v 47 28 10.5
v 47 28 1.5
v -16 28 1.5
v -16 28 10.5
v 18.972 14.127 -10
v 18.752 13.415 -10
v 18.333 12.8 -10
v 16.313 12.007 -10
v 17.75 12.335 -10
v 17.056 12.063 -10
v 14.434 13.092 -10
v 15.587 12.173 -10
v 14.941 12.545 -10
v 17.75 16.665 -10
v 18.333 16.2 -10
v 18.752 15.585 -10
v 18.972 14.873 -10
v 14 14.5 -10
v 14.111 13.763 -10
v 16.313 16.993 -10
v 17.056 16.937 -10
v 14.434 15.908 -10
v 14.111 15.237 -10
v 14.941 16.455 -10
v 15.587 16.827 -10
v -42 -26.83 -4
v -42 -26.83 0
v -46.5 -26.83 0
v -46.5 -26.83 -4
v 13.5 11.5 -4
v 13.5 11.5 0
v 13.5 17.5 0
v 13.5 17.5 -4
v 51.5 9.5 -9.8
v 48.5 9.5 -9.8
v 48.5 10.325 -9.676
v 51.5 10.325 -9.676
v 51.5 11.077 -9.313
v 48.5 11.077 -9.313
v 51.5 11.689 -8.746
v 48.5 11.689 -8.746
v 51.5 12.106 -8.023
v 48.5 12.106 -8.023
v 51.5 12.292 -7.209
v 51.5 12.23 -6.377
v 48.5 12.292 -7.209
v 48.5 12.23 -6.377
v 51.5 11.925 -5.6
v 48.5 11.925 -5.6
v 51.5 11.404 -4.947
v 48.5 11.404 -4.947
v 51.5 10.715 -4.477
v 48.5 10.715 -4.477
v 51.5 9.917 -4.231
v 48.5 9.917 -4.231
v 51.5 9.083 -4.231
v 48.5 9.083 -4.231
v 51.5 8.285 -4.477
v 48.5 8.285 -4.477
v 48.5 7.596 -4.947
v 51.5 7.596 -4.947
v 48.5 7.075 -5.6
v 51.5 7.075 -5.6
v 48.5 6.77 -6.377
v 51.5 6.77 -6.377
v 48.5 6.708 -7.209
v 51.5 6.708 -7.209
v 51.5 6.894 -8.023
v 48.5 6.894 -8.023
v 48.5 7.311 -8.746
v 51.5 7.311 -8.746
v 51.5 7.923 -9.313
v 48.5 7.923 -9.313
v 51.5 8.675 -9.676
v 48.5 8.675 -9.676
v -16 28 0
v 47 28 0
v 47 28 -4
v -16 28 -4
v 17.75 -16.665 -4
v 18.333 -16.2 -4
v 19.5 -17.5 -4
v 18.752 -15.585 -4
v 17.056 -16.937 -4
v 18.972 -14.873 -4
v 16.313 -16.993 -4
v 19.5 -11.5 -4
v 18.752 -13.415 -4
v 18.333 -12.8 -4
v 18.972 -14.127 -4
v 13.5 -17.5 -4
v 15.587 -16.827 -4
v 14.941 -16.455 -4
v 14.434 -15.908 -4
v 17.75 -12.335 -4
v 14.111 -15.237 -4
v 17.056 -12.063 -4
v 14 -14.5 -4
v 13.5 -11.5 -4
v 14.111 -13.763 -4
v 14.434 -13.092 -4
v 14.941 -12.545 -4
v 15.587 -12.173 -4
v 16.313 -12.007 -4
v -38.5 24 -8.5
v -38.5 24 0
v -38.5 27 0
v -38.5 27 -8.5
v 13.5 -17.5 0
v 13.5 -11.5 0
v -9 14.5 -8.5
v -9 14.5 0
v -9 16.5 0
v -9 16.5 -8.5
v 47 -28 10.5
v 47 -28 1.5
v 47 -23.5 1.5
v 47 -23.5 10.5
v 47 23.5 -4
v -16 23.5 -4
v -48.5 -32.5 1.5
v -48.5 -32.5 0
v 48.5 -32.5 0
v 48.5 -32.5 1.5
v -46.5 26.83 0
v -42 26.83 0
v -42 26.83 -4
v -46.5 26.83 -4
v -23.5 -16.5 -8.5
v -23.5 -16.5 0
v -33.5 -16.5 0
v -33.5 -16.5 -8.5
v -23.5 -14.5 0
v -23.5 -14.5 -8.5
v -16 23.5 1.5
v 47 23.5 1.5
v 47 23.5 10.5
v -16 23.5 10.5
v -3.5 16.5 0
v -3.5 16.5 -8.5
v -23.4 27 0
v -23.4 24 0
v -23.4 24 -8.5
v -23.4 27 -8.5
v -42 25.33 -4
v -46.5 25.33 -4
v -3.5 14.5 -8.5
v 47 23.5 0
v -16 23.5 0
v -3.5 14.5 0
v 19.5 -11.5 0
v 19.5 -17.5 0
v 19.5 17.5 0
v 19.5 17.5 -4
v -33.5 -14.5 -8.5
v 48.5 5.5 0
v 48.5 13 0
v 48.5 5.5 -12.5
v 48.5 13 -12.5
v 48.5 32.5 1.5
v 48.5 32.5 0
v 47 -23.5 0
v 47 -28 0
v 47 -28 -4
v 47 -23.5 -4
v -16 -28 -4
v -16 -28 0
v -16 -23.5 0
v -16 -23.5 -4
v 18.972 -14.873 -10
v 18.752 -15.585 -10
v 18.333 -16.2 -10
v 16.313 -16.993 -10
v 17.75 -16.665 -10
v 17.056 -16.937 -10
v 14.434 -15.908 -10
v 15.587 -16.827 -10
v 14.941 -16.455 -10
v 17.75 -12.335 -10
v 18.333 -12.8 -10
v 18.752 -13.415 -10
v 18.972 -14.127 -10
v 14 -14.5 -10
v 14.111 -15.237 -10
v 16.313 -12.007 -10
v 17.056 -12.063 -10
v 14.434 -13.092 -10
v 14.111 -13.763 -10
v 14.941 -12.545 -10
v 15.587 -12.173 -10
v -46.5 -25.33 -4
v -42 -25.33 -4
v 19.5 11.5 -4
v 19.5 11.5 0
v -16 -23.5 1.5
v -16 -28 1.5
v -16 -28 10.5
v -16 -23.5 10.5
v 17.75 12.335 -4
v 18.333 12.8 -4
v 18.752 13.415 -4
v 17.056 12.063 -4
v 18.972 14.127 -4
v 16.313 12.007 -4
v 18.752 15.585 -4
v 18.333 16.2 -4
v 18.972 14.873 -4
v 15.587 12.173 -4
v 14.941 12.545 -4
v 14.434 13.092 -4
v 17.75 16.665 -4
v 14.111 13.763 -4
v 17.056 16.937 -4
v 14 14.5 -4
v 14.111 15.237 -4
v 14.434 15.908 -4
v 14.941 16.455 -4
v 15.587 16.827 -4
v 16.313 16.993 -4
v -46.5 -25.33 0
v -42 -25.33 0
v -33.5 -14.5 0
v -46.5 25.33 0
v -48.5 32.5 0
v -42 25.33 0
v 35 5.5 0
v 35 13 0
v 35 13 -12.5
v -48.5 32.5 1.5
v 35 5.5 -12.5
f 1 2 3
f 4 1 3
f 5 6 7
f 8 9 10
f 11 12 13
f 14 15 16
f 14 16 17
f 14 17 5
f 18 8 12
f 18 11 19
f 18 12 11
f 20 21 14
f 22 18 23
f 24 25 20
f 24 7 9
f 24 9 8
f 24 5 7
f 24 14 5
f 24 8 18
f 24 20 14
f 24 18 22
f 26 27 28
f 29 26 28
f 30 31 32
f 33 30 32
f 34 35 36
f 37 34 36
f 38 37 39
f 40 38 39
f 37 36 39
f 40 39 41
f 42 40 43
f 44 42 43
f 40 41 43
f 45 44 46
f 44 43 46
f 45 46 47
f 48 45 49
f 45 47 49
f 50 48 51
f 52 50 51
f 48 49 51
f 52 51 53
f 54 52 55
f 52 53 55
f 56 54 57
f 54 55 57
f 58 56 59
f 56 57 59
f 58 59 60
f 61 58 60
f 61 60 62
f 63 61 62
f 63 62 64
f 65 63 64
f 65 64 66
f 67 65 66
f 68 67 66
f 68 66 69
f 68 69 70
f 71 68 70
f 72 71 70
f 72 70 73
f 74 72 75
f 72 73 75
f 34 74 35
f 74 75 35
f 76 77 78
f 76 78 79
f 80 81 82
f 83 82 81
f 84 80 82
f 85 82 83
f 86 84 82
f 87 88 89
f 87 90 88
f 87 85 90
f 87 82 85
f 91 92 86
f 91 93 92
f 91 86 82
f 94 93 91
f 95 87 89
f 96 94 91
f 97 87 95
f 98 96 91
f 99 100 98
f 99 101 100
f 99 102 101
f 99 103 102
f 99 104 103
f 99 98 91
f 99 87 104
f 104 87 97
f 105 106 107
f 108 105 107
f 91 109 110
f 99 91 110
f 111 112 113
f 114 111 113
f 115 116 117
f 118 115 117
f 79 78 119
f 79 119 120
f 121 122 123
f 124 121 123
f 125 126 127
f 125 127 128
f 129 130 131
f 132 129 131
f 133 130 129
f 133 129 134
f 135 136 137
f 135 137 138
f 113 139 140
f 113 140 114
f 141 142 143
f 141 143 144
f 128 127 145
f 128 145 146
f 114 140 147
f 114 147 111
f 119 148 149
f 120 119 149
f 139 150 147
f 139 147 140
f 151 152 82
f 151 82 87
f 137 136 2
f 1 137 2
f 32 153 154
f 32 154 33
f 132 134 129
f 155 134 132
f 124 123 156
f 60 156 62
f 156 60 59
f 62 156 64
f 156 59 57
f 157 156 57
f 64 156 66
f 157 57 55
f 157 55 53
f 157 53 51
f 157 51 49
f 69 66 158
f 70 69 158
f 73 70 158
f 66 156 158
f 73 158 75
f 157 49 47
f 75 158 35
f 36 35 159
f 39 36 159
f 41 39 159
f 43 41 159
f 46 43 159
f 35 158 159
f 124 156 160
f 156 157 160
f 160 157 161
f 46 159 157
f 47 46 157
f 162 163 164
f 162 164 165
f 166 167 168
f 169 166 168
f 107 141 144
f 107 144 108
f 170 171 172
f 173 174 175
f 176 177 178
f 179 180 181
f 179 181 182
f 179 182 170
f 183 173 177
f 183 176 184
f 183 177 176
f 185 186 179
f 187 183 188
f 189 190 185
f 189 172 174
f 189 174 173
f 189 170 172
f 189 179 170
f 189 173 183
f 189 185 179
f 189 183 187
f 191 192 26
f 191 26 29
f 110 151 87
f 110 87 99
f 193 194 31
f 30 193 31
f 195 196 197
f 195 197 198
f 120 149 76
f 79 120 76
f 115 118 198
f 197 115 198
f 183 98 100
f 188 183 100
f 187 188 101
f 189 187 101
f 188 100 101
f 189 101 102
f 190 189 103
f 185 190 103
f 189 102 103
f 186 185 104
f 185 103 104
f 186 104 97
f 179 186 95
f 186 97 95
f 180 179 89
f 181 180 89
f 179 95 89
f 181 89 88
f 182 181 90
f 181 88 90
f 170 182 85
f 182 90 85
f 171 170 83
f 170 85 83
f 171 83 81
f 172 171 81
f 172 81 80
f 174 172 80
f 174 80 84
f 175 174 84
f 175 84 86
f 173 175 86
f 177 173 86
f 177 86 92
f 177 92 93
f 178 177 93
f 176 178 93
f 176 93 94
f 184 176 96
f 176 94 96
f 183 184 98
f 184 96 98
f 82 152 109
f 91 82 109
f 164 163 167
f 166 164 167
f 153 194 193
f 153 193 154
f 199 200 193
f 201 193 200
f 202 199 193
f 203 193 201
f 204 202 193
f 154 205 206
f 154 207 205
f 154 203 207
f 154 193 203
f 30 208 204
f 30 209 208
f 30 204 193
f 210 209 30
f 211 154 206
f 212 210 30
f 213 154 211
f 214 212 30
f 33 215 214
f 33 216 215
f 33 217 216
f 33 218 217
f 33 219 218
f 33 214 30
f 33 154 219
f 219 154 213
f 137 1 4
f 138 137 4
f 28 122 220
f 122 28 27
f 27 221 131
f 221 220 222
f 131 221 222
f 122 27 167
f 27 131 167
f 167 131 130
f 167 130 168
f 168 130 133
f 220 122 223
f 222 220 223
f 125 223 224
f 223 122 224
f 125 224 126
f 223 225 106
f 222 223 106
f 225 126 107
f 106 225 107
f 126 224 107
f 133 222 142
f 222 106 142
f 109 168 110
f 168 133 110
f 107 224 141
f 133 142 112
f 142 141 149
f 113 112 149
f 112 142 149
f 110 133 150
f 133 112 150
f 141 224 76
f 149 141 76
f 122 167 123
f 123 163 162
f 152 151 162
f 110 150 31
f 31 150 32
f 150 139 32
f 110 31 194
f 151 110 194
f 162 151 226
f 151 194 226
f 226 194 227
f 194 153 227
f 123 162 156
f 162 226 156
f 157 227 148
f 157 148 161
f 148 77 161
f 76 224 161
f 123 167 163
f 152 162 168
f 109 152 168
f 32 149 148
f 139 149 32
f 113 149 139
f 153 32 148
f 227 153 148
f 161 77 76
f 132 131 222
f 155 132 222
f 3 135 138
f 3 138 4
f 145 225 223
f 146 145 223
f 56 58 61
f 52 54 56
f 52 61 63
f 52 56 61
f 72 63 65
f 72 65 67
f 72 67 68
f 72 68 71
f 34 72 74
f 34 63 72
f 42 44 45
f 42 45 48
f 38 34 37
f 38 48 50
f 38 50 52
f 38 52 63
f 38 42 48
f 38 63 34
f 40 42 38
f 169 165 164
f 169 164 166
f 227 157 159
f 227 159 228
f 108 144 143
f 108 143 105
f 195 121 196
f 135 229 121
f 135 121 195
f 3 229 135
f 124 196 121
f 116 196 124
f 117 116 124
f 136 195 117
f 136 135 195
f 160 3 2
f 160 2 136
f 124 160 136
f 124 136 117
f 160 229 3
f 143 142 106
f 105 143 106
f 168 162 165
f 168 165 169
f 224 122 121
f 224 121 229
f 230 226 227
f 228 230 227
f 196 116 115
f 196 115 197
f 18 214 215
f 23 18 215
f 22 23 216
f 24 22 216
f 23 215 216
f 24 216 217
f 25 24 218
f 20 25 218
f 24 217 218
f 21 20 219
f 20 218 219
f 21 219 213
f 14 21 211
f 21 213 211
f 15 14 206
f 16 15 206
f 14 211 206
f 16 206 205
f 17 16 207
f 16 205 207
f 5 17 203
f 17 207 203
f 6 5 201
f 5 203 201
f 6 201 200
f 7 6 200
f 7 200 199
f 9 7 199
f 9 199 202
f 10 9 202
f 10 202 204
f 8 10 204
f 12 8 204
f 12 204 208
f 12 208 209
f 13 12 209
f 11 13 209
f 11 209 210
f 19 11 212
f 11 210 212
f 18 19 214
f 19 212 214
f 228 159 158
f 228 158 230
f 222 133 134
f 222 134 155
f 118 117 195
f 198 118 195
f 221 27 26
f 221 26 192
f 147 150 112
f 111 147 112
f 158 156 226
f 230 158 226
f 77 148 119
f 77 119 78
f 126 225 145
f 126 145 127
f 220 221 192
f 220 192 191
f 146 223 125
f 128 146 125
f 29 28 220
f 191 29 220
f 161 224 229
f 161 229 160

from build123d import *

# Parameters (mm, degrees)
SKETCH1_W                = 97
SKETCH1_H                = 65
BOSS_EXTRUDE1_DEPTH      = 1.5
SKETCH2_W                = 63
SKETCH2_H                = 4.5
BOSS_EXTRUDE2_DEPTH      = 4
BOSS_EXTRUDE2_DEPTH_BACK = 10.5
SKETCH3_W                = 13.5
SKETCH3_H                = 7.5
BOSS_EXTRUDE3_DEPTH      = 12.5
SKETCH4_R                = 2.8
BOSS_EXTRUDE4_DEPTH      = 3
SKETCH5_W                = 4.5
SKETCH5_H                = 1.5
BOSS_EXTRUDE5_DEPTH      = 4
SKETCH6_W                = 15.1
SKETCH6_H                = 3
BOSS_EXTRUDE6_DEPTH      = 8.5
SKETCH7_W                = 10
SKETCH7_H                = 2
BOSS_EXTRUDE7_DEPTH      = 8.5
SKETCH8_W                = 5.5
SKETCH8_H                = 2
BOSS_EXTRUDE8_DEPTH      = 8.5
SKETCH9_W                = 6
SKETCH9_H                = 6
BOSS_EXTRUDE9_DEPTH      = 4
SKETCH10_R               = 2.5
BOSS_EXTRUDE10_DEPTH     = 6
SKETCH13_R               = 2.5
BOSS_EXTRUDE11_DEPTH     = 6


with BuildPart() as part:
    # Sketch1 → Boss-Extrude1 (new body)
    with BuildSketch(Plane.XY):
        Rectangle(SKETCH1_W, SKETCH1_H)
    extrude(amount=BOSS_EXTRUDE1_DEPTH)

    # Sketch2 → Boss-Extrude2 (add, two sides)
    with BuildSketch(Plane(origin=(0, 0, 0), x_dir=(-1, 0, 0), z_dir=(0, 0, -1))) as boss_extrude2_sk:
        with Locations((-15.5, 25.75)):
            Rectangle(SKETCH2_W, SKETCH2_H)
        with Locations((-15.5, -25.75)):
            Rectangle(SKETCH2_W, SKETCH2_H)
    extrude(amount=BOSS_EXTRUDE2_DEPTH)
    extrude(boss_extrude2_sk.sketch, amount=-BOSS_EXTRUDE2_DEPTH_BACK)

    # Sketch3 → Boss-Extrude3 (add)
    with BuildSketch(Plane(origin=(0, 0, 0), x_dir=(-1, 0, 0), z_dir=(0, 0, -1))):
        with Locations((-41.75, 9.25)):
            Rectangle(SKETCH3_W, SKETCH3_H)
    extrude(amount=BOSS_EXTRUDE3_DEPTH)

    # Sketch4 → Boss-Extrude4 (add)
    with BuildSketch(Plane(origin=(48.5, 0, 0), x_dir=(0, 0, -1), z_dir=(1, 0, 0))):
        with Locations((7, 9.5)):
            Circle(SKETCH4_R)
    extrude(amount=BOSS_EXTRUDE4_DEPTH)

    # Sketch5 → Boss-Extrude5 (add)
    with BuildSketch(Plane(origin=(0, 0, 0), x_dir=(-1, 0, 0), z_dir=(0, 0, -1))):
        with Locations((44.25, -26.080181332)):
            Rectangle(SKETCH5_W, SKETCH5_H)
        with Locations((44.25, 26.080181332)):
            Rectangle(SKETCH5_W, SKETCH5_H)
    extrude(amount=BOSS_EXTRUDE5_DEPTH)

    # Sketch6 → Boss-Extrude6 (add)
    with BuildSketch(Plane(origin=(0, 0, 0), x_dir=(-1, 0, 0), z_dir=(0, 0, -1))):
        with Locations((30.95, 25.5)):
            Rectangle(SKETCH6_W, SKETCH6_H)
    extrude(amount=BOSS_EXTRUDE6_DEPTH)

    # Sketch7 → Boss-Extrude7 (add)
    with BuildSketch(Plane(origin=(0, 0, 0), x_dir=(-1, 0, 0), z_dir=(0, 0, -1))):
        with Locations((28.5, -15.5)):
            Rectangle(SKETCH7_W, SKETCH7_H)
    extrude(amount=BOSS_EXTRUDE7_DEPTH)

    # Sketch8 → Boss-Extrude8 (add)
    with BuildSketch(Plane(origin=(0, 0, 0), x_dir=(-1, 0, 0), z_dir=(0, 0, -1))):
        with Locations((6.25, 15.5)):
            Rectangle(SKETCH8_W, SKETCH8_H)
    extrude(amount=BOSS_EXTRUDE8_DEPTH)

    # Sketch9 → Boss-Extrude9 (add)
    with BuildSketch(Plane(origin=(0, 0, 0), x_dir=(-1, 0, 0), z_dir=(0, 0, -1))):
        with Locations((-16.5, -14.5)):
            Rectangle(SKETCH9_W, SKETCH9_H)
        with Locations((-16.5, 14.5)):
            Rectangle(SKETCH9_W, SKETCH9_H)
    extrude(amount=BOSS_EXTRUDE9_DEPTH)

    # Sketch10 → Boss-Extrude10 (add)
    with BuildSketch(Plane(origin=(0, 0, -4), x_dir=(-1, 0, 0), z_dir=(0, 0, -1))):
        with Locations((-16.5, 14.5)):
            Circle(SKETCH10_R)
    extrude(amount=BOSS_EXTRUDE10_DEPTH)

    # Sketch13 → Boss-Extrude11 (add)
    with BuildSketch(Plane(origin=(0, 0, -4), x_dir=(-1, 0, 0), z_dir=(0, 0, -1))):
        with Locations((-16.5, -14.5)):
            Circle(SKETCH13_R)
    extrude(amount=BOSS_EXTRUDE11_DEPTH)


solid = part.part
